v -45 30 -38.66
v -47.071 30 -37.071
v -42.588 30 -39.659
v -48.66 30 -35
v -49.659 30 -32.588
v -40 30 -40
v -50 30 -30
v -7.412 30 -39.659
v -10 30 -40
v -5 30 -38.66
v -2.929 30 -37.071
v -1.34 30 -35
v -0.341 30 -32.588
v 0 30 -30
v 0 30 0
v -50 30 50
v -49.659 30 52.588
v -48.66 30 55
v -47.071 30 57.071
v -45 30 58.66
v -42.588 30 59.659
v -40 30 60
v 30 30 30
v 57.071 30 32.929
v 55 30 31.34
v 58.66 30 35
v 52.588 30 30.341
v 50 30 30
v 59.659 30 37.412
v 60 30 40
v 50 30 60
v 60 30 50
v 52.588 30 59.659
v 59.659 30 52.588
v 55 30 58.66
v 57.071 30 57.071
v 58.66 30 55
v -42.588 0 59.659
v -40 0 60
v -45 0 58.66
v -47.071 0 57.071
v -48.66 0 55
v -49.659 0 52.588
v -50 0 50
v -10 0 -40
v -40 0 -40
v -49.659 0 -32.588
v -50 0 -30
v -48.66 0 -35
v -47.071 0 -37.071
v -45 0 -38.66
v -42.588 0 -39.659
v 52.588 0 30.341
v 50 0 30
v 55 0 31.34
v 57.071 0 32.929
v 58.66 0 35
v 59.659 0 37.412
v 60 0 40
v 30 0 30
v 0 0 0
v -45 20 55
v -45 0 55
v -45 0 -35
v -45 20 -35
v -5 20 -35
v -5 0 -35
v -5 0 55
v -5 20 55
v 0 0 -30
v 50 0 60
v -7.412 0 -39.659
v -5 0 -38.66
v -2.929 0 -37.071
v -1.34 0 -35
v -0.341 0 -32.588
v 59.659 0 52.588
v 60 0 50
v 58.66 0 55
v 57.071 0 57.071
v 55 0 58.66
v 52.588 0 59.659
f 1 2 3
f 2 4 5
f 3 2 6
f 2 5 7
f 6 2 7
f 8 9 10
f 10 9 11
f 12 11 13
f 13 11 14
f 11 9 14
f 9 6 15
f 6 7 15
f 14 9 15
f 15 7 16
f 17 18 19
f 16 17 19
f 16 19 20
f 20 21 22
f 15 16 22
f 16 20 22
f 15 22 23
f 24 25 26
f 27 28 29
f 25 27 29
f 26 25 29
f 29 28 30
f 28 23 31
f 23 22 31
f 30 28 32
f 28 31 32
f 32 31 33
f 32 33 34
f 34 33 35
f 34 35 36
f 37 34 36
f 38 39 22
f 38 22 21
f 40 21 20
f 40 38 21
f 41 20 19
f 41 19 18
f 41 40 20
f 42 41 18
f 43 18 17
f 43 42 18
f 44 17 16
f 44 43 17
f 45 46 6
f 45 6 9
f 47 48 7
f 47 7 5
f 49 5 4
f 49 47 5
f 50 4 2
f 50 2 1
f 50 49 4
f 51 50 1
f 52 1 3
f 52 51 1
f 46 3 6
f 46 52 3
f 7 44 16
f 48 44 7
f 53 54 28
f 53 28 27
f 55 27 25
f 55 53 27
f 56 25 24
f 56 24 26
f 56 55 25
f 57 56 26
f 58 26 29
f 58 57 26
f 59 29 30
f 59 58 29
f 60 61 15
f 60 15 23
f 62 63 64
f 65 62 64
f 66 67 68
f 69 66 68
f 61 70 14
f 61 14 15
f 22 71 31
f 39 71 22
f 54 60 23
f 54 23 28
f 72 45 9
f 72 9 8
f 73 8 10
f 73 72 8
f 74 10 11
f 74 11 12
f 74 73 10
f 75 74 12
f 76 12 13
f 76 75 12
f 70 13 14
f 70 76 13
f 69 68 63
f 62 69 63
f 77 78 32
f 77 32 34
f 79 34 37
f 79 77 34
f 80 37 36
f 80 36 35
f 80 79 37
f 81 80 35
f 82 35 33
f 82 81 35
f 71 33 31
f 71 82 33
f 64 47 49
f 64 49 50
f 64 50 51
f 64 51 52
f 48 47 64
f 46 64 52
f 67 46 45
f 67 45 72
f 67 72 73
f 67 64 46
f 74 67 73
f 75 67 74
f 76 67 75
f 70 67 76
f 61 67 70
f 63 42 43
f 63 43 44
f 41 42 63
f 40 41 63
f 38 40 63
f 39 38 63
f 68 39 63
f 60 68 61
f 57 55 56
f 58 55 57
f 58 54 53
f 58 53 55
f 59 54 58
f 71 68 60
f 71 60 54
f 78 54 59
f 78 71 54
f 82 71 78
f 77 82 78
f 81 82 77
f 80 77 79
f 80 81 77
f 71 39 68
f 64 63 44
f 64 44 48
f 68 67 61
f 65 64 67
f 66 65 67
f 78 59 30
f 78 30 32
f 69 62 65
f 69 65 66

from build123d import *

# Parameters (mm, degrees)
F1_DEPTH = 30
F2_DEPTH = 20


with BuildPart() as f1:
    # F0 (on Front) → F1 (new body)
    with BuildSketch(Plane.XZ):
        with BuildLine():
            Line((0, -30), (0, 0))
            Line((0, 0), (30, 30))
            Line((30, 30), (50, 30))
            ThreePointArc((50, 30), (57.071068, 32.928932), (60, 40))
            Line((60, 40), (60, 50))
            ThreePointArc((60, 50), (57.071068, 57.071068), (50, 60))
            Line((50, 60), (-40, 60))
            ThreePointArc((-40, 60), (-47.071068, 57.071068), (-50, 50))
            Line((-50, 50), (-50, -30))
            ThreePointArc((-50, -30), (-47.071068, -37.071068), (-40, -40))
            Line((-40, -40), (-10, -40))
            ThreePointArc((-10, -40), (-2.928932, -37.071068), (0, -30))
        make_face()
        Polygon((-45, -35), (-45, 15), (-45, 55), (-5, 55), (-5, -35), align=None, mode=Mode.SUBTRACT)
        Polygon((-45, 55), (-45, 15), (-45, -35), (-5, -35), (-5, 55), align=None)
    extrude(amount=-F1_DEPTH)

    # F0 (on Front) → F2 (cut)
    with BuildSketch(Plane.XZ):
        Polygon((-45, 55), (-45, 15), (-45, -35), (-5, -35), (-5, 55), align=None)
    extrude(amount=-F2_DEPTH, mode=Mode.SUBTRACT)


solid = f1.part
